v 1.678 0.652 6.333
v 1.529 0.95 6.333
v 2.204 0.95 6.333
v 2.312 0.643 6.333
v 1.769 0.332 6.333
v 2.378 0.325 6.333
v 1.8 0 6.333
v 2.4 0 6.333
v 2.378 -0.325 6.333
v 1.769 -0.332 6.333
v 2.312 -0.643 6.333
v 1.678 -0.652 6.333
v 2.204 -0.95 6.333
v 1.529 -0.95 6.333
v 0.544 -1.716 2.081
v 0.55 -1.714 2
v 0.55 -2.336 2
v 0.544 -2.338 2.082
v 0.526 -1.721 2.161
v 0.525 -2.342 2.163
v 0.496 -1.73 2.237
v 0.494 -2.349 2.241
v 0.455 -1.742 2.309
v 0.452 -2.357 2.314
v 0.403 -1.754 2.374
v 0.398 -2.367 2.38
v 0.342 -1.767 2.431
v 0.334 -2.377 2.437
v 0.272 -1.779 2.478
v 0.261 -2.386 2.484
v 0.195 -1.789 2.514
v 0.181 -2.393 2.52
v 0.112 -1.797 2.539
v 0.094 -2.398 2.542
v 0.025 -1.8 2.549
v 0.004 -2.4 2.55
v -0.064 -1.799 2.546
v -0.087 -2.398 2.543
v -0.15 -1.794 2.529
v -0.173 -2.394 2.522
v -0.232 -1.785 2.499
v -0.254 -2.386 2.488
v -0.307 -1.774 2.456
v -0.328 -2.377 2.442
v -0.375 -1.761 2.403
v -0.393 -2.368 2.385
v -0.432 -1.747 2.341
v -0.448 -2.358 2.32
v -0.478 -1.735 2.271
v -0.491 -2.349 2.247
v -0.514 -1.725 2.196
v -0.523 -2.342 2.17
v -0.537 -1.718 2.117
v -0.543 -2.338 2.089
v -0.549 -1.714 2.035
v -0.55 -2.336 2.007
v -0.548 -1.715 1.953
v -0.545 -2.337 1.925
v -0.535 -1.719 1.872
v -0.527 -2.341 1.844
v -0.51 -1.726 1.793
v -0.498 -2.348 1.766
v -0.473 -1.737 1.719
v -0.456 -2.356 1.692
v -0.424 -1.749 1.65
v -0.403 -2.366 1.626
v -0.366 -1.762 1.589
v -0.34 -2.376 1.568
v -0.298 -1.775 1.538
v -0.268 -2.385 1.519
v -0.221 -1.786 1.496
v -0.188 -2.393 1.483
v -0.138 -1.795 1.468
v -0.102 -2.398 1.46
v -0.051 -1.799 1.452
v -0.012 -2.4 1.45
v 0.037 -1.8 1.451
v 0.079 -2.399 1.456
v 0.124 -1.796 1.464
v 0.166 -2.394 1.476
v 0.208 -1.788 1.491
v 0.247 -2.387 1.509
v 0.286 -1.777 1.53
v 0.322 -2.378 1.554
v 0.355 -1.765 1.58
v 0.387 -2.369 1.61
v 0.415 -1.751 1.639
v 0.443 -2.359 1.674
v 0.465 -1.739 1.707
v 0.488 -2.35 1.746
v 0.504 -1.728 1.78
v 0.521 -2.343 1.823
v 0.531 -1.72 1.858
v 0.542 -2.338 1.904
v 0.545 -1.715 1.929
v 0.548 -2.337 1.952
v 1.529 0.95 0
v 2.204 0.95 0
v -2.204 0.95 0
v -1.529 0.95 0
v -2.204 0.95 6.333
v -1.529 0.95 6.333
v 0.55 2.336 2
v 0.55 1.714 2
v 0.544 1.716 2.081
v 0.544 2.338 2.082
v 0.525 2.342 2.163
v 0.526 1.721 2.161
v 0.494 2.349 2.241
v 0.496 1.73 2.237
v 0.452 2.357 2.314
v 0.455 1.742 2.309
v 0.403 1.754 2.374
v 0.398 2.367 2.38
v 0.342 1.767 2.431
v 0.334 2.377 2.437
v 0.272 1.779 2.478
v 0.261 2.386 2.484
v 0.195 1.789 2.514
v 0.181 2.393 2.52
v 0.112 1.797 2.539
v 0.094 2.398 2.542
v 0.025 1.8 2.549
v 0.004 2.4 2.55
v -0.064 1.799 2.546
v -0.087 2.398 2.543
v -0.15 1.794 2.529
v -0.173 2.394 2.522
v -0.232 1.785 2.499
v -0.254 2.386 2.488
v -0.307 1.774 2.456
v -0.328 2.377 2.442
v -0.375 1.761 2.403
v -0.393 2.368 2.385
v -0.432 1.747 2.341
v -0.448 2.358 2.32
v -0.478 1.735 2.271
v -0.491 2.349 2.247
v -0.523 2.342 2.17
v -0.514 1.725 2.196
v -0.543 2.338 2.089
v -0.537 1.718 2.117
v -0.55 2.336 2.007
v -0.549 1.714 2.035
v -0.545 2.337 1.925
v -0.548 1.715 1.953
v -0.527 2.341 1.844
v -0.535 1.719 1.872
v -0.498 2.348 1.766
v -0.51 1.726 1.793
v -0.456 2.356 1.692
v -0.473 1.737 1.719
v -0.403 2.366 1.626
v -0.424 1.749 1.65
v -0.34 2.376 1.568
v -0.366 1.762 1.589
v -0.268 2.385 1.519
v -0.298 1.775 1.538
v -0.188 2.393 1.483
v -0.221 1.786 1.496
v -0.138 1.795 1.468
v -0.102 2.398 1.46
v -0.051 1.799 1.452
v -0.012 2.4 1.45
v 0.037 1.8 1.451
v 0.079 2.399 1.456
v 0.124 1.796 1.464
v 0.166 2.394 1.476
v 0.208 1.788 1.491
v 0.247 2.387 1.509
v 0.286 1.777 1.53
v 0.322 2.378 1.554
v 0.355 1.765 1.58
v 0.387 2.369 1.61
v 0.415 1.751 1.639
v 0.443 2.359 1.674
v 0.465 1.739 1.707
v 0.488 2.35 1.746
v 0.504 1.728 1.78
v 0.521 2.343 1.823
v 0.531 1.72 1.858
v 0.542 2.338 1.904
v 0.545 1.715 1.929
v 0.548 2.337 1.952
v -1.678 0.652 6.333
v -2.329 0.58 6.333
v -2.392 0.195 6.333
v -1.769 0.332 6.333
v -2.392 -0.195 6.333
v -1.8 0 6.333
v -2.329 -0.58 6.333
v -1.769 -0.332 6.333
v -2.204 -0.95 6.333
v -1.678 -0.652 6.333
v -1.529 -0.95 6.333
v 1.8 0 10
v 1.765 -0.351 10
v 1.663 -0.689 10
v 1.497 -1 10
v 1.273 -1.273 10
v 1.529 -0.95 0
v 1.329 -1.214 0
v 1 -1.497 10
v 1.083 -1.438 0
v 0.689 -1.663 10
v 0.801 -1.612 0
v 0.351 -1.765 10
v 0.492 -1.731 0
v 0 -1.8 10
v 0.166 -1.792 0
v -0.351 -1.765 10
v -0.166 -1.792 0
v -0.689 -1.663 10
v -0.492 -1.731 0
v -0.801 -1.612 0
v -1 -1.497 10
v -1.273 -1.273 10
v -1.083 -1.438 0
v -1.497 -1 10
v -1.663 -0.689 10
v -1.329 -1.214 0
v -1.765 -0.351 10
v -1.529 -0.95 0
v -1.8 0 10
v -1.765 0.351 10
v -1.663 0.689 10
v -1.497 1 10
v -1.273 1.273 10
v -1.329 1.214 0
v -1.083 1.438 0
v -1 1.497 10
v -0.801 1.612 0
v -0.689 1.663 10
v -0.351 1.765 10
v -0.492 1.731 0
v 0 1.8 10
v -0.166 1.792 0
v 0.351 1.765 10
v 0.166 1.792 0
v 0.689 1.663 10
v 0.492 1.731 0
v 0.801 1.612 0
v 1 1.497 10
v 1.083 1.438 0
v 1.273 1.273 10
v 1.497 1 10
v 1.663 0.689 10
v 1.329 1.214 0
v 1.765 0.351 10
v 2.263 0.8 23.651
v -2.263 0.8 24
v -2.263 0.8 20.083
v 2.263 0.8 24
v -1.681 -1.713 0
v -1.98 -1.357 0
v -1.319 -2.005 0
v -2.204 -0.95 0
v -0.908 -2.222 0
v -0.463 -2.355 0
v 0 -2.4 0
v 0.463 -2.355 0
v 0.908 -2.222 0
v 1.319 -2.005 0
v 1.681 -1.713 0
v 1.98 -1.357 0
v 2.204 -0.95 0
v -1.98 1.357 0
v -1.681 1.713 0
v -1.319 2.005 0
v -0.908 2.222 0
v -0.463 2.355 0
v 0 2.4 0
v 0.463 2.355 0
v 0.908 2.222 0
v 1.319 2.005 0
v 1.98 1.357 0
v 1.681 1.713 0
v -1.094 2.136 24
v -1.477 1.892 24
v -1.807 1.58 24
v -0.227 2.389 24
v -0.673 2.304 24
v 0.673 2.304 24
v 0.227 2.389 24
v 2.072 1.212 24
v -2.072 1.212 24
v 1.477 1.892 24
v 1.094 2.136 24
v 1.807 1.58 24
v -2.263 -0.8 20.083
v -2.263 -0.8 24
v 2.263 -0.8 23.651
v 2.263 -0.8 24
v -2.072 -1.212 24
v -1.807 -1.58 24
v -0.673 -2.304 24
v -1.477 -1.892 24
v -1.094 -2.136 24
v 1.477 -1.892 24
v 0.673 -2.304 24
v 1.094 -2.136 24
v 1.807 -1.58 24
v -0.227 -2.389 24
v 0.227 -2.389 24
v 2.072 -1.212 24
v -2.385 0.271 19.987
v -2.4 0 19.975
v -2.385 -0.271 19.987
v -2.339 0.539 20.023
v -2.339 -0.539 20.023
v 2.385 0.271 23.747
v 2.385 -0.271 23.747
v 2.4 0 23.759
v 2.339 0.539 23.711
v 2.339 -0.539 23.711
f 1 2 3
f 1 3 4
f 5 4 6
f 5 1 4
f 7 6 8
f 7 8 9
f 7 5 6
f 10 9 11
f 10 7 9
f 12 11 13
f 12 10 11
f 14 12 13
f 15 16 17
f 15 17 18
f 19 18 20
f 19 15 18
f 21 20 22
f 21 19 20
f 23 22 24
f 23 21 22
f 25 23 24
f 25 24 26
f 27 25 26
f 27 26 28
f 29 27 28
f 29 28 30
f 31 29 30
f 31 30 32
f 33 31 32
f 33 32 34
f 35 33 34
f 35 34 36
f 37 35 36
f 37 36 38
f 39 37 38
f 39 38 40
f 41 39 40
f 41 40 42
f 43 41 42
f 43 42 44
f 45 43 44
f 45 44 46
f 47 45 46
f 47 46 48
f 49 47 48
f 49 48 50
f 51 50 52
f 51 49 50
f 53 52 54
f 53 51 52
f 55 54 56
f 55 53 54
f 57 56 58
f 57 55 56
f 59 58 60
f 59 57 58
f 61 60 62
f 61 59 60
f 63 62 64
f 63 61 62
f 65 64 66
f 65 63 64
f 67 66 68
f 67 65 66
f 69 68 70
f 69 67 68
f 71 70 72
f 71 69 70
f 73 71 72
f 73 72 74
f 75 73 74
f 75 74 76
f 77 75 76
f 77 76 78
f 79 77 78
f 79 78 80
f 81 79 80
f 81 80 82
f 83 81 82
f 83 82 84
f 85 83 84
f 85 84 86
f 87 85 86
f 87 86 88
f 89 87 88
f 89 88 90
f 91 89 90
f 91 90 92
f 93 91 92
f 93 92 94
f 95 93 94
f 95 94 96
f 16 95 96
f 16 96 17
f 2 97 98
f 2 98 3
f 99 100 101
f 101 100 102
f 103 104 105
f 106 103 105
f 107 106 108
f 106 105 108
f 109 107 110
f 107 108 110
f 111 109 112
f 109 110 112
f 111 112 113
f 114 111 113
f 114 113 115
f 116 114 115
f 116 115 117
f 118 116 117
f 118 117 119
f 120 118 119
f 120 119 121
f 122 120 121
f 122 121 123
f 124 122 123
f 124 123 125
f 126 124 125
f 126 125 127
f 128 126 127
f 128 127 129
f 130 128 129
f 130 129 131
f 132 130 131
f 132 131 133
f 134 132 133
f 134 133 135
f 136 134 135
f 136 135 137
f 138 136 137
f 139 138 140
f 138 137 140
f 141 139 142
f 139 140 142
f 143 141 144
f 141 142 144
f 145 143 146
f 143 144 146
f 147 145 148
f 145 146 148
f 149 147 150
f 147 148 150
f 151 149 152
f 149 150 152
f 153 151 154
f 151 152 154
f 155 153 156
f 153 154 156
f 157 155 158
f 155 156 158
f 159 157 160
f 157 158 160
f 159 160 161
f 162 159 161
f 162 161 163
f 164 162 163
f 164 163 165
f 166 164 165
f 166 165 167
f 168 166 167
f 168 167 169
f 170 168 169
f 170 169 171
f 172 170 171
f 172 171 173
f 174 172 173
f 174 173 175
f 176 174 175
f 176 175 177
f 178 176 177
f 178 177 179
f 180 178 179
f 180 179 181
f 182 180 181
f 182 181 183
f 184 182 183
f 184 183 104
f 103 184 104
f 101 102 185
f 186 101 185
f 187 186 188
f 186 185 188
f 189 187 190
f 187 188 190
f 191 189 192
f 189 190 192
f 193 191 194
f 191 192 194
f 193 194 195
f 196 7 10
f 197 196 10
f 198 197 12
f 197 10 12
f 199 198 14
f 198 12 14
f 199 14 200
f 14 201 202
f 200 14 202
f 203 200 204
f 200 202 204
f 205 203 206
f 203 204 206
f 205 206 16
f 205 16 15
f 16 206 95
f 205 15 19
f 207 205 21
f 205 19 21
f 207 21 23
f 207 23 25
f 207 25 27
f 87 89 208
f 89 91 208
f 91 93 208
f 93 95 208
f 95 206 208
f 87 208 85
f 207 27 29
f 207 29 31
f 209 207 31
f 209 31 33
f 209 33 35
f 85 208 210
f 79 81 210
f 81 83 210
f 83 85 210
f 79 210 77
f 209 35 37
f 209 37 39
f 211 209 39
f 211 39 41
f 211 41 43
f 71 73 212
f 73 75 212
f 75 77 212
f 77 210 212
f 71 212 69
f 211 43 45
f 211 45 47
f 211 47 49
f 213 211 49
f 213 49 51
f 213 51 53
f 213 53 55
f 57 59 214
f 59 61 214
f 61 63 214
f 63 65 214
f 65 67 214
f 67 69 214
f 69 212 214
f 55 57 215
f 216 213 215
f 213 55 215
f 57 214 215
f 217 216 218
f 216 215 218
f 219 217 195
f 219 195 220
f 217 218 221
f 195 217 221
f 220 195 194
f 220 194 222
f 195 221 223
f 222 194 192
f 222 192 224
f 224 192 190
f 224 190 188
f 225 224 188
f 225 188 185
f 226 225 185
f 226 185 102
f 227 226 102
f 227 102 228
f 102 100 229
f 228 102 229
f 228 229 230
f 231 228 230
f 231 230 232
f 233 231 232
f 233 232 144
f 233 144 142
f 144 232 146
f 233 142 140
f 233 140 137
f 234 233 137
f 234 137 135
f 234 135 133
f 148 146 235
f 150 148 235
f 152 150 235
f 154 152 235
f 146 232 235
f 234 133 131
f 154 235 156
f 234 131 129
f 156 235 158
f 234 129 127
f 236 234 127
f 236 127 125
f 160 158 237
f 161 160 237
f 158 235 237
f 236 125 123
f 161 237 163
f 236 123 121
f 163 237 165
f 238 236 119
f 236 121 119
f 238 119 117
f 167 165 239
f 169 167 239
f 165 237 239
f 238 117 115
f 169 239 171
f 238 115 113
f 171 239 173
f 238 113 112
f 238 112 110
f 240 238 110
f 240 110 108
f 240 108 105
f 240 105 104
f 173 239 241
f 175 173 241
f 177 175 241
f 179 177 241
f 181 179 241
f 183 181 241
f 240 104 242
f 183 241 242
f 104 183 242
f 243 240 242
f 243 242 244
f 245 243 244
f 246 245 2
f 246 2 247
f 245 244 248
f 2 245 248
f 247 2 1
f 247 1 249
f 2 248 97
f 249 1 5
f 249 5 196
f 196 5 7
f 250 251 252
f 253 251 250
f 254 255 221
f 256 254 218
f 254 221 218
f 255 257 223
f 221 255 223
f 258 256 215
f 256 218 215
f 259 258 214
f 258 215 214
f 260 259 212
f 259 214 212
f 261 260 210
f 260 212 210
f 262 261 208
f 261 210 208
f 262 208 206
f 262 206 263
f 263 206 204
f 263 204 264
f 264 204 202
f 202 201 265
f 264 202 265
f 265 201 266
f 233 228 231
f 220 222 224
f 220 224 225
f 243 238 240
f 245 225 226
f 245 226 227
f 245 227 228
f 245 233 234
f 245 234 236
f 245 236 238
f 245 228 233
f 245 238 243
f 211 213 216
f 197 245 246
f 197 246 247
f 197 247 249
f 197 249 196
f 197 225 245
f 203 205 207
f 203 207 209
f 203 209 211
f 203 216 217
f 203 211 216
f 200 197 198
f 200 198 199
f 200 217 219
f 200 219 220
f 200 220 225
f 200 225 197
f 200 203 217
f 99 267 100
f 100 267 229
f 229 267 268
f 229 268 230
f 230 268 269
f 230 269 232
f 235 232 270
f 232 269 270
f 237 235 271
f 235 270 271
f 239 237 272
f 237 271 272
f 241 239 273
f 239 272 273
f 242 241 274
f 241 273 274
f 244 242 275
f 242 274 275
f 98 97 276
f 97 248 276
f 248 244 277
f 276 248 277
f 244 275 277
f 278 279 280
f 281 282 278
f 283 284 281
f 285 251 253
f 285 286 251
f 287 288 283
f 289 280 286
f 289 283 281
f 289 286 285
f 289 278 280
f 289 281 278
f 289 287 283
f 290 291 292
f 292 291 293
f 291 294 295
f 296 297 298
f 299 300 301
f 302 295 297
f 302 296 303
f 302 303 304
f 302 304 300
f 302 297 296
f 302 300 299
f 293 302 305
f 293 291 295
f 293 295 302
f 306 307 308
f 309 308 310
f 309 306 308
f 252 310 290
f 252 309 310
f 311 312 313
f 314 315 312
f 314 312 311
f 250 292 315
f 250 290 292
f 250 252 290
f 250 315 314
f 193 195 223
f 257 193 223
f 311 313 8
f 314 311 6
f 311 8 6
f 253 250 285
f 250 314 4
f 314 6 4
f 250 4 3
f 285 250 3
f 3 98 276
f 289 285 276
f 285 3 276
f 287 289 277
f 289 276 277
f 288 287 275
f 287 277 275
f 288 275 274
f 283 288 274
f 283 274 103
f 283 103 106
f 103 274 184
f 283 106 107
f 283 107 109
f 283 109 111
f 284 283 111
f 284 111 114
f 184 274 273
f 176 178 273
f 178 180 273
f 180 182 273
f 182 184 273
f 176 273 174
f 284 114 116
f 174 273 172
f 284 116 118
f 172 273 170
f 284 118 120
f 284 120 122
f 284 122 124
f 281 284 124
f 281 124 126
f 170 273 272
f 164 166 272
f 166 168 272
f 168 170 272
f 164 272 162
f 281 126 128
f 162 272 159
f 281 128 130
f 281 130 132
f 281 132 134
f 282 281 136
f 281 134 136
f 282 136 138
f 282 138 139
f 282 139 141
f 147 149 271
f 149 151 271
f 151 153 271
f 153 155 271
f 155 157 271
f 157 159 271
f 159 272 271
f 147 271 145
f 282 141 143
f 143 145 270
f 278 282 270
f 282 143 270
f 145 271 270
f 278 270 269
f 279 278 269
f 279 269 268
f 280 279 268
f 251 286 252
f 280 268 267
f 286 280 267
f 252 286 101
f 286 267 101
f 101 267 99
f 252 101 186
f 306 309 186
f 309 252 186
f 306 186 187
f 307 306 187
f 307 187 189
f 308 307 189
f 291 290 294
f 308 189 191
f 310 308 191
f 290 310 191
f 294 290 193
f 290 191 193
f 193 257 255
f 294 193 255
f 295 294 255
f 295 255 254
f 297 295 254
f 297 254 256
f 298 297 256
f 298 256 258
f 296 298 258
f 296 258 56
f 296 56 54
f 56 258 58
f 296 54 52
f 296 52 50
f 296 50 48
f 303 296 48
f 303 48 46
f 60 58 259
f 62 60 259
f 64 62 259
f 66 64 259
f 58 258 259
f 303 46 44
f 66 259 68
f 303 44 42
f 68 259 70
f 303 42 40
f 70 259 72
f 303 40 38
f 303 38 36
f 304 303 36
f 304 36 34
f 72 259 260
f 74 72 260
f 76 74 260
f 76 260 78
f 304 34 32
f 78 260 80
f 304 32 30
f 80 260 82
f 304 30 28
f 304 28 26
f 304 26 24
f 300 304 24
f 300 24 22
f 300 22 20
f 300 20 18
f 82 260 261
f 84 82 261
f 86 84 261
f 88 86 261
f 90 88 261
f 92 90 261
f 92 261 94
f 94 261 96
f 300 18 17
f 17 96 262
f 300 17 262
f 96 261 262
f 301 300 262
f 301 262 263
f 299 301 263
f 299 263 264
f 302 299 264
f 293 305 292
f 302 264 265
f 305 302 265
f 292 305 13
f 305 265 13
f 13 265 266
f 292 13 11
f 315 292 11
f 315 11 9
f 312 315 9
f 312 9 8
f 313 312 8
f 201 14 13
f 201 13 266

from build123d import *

# Parameters (mm, degrees)
F0_R          = 2.4
F1_DEPTH      = 24
F2_R          = 1.8
F3_DEPTH      = 10
F5_DEPTH      = 25
F5_DEPTH_BACK = 25
F7_DEPTH      = 0.8
F7_DEPTH_BACK = 0.8
F8_R          = 0.55
F9_DEPTH      = 2.401
F9_DEPTH_BACK = 2.401


with BuildPart() as f1:
    # F0 (on Top) → F1 (new body)
    with BuildSketch(Plane.XY):
        Circle(F0_R)
    extrude(amount=F1_DEPTH)

    # F2 (on face) → F3 (cut)
    with BuildSketch(Plane(origin=(0, 0, 0), x_dir=(1, 0, 0), z_dir=(0, 0, -1))):
        Circle(F2_R)
    extrude(amount=-F3_DEPTH, mode=Mode.SUBTRACT)

    # F4 (on Right) → F5 (cut, two sides)
    with BuildSketch(Plane.YZ) as f5_sk:
        Polygon((-0.95, 0), (0.95, 0), (0.95, 6.3333333333), (0, 6.3333333333), (-0.95, 6.3333333333), align=None)
    extrude(amount=-F5_DEPTH, mode=Mode.SUBTRACT)
    extrude(f5_sk.sketch, amount=F5_DEPTH_BACK, mode=Mode.SUBTRACT)

    # F6 (on Front) → F7 (cut, two sides)
    with BuildSketch(Plane.XZ) as f7_sk:
        Polygon((-2.4, 24), (-2.4946786115, 24), (-2.4946786115, 19.9), (2.7053213885, 24), (2.4, 24), align=None)
    extrude(amount=F7_DEPTH, mode=Mode.SUBTRACT)
    extrude(f7_sk.sketch, amount=-F7_DEPTH_BACK, mode=Mode.SUBTRACT)

    # F8 (on Front) → F9 (cut, two sides)
    with BuildSketch(Plane.XZ) as f9_sk:
        with Locations((0, 2)):
            Circle(F8_R)
    extrude(amount=-F9_DEPTH, mode=Mode.SUBTRACT)
    extrude(f9_sk.sketch, amount=F9_DEPTH_BACK, mode=Mode.SUBTRACT)


solid = f1.part
